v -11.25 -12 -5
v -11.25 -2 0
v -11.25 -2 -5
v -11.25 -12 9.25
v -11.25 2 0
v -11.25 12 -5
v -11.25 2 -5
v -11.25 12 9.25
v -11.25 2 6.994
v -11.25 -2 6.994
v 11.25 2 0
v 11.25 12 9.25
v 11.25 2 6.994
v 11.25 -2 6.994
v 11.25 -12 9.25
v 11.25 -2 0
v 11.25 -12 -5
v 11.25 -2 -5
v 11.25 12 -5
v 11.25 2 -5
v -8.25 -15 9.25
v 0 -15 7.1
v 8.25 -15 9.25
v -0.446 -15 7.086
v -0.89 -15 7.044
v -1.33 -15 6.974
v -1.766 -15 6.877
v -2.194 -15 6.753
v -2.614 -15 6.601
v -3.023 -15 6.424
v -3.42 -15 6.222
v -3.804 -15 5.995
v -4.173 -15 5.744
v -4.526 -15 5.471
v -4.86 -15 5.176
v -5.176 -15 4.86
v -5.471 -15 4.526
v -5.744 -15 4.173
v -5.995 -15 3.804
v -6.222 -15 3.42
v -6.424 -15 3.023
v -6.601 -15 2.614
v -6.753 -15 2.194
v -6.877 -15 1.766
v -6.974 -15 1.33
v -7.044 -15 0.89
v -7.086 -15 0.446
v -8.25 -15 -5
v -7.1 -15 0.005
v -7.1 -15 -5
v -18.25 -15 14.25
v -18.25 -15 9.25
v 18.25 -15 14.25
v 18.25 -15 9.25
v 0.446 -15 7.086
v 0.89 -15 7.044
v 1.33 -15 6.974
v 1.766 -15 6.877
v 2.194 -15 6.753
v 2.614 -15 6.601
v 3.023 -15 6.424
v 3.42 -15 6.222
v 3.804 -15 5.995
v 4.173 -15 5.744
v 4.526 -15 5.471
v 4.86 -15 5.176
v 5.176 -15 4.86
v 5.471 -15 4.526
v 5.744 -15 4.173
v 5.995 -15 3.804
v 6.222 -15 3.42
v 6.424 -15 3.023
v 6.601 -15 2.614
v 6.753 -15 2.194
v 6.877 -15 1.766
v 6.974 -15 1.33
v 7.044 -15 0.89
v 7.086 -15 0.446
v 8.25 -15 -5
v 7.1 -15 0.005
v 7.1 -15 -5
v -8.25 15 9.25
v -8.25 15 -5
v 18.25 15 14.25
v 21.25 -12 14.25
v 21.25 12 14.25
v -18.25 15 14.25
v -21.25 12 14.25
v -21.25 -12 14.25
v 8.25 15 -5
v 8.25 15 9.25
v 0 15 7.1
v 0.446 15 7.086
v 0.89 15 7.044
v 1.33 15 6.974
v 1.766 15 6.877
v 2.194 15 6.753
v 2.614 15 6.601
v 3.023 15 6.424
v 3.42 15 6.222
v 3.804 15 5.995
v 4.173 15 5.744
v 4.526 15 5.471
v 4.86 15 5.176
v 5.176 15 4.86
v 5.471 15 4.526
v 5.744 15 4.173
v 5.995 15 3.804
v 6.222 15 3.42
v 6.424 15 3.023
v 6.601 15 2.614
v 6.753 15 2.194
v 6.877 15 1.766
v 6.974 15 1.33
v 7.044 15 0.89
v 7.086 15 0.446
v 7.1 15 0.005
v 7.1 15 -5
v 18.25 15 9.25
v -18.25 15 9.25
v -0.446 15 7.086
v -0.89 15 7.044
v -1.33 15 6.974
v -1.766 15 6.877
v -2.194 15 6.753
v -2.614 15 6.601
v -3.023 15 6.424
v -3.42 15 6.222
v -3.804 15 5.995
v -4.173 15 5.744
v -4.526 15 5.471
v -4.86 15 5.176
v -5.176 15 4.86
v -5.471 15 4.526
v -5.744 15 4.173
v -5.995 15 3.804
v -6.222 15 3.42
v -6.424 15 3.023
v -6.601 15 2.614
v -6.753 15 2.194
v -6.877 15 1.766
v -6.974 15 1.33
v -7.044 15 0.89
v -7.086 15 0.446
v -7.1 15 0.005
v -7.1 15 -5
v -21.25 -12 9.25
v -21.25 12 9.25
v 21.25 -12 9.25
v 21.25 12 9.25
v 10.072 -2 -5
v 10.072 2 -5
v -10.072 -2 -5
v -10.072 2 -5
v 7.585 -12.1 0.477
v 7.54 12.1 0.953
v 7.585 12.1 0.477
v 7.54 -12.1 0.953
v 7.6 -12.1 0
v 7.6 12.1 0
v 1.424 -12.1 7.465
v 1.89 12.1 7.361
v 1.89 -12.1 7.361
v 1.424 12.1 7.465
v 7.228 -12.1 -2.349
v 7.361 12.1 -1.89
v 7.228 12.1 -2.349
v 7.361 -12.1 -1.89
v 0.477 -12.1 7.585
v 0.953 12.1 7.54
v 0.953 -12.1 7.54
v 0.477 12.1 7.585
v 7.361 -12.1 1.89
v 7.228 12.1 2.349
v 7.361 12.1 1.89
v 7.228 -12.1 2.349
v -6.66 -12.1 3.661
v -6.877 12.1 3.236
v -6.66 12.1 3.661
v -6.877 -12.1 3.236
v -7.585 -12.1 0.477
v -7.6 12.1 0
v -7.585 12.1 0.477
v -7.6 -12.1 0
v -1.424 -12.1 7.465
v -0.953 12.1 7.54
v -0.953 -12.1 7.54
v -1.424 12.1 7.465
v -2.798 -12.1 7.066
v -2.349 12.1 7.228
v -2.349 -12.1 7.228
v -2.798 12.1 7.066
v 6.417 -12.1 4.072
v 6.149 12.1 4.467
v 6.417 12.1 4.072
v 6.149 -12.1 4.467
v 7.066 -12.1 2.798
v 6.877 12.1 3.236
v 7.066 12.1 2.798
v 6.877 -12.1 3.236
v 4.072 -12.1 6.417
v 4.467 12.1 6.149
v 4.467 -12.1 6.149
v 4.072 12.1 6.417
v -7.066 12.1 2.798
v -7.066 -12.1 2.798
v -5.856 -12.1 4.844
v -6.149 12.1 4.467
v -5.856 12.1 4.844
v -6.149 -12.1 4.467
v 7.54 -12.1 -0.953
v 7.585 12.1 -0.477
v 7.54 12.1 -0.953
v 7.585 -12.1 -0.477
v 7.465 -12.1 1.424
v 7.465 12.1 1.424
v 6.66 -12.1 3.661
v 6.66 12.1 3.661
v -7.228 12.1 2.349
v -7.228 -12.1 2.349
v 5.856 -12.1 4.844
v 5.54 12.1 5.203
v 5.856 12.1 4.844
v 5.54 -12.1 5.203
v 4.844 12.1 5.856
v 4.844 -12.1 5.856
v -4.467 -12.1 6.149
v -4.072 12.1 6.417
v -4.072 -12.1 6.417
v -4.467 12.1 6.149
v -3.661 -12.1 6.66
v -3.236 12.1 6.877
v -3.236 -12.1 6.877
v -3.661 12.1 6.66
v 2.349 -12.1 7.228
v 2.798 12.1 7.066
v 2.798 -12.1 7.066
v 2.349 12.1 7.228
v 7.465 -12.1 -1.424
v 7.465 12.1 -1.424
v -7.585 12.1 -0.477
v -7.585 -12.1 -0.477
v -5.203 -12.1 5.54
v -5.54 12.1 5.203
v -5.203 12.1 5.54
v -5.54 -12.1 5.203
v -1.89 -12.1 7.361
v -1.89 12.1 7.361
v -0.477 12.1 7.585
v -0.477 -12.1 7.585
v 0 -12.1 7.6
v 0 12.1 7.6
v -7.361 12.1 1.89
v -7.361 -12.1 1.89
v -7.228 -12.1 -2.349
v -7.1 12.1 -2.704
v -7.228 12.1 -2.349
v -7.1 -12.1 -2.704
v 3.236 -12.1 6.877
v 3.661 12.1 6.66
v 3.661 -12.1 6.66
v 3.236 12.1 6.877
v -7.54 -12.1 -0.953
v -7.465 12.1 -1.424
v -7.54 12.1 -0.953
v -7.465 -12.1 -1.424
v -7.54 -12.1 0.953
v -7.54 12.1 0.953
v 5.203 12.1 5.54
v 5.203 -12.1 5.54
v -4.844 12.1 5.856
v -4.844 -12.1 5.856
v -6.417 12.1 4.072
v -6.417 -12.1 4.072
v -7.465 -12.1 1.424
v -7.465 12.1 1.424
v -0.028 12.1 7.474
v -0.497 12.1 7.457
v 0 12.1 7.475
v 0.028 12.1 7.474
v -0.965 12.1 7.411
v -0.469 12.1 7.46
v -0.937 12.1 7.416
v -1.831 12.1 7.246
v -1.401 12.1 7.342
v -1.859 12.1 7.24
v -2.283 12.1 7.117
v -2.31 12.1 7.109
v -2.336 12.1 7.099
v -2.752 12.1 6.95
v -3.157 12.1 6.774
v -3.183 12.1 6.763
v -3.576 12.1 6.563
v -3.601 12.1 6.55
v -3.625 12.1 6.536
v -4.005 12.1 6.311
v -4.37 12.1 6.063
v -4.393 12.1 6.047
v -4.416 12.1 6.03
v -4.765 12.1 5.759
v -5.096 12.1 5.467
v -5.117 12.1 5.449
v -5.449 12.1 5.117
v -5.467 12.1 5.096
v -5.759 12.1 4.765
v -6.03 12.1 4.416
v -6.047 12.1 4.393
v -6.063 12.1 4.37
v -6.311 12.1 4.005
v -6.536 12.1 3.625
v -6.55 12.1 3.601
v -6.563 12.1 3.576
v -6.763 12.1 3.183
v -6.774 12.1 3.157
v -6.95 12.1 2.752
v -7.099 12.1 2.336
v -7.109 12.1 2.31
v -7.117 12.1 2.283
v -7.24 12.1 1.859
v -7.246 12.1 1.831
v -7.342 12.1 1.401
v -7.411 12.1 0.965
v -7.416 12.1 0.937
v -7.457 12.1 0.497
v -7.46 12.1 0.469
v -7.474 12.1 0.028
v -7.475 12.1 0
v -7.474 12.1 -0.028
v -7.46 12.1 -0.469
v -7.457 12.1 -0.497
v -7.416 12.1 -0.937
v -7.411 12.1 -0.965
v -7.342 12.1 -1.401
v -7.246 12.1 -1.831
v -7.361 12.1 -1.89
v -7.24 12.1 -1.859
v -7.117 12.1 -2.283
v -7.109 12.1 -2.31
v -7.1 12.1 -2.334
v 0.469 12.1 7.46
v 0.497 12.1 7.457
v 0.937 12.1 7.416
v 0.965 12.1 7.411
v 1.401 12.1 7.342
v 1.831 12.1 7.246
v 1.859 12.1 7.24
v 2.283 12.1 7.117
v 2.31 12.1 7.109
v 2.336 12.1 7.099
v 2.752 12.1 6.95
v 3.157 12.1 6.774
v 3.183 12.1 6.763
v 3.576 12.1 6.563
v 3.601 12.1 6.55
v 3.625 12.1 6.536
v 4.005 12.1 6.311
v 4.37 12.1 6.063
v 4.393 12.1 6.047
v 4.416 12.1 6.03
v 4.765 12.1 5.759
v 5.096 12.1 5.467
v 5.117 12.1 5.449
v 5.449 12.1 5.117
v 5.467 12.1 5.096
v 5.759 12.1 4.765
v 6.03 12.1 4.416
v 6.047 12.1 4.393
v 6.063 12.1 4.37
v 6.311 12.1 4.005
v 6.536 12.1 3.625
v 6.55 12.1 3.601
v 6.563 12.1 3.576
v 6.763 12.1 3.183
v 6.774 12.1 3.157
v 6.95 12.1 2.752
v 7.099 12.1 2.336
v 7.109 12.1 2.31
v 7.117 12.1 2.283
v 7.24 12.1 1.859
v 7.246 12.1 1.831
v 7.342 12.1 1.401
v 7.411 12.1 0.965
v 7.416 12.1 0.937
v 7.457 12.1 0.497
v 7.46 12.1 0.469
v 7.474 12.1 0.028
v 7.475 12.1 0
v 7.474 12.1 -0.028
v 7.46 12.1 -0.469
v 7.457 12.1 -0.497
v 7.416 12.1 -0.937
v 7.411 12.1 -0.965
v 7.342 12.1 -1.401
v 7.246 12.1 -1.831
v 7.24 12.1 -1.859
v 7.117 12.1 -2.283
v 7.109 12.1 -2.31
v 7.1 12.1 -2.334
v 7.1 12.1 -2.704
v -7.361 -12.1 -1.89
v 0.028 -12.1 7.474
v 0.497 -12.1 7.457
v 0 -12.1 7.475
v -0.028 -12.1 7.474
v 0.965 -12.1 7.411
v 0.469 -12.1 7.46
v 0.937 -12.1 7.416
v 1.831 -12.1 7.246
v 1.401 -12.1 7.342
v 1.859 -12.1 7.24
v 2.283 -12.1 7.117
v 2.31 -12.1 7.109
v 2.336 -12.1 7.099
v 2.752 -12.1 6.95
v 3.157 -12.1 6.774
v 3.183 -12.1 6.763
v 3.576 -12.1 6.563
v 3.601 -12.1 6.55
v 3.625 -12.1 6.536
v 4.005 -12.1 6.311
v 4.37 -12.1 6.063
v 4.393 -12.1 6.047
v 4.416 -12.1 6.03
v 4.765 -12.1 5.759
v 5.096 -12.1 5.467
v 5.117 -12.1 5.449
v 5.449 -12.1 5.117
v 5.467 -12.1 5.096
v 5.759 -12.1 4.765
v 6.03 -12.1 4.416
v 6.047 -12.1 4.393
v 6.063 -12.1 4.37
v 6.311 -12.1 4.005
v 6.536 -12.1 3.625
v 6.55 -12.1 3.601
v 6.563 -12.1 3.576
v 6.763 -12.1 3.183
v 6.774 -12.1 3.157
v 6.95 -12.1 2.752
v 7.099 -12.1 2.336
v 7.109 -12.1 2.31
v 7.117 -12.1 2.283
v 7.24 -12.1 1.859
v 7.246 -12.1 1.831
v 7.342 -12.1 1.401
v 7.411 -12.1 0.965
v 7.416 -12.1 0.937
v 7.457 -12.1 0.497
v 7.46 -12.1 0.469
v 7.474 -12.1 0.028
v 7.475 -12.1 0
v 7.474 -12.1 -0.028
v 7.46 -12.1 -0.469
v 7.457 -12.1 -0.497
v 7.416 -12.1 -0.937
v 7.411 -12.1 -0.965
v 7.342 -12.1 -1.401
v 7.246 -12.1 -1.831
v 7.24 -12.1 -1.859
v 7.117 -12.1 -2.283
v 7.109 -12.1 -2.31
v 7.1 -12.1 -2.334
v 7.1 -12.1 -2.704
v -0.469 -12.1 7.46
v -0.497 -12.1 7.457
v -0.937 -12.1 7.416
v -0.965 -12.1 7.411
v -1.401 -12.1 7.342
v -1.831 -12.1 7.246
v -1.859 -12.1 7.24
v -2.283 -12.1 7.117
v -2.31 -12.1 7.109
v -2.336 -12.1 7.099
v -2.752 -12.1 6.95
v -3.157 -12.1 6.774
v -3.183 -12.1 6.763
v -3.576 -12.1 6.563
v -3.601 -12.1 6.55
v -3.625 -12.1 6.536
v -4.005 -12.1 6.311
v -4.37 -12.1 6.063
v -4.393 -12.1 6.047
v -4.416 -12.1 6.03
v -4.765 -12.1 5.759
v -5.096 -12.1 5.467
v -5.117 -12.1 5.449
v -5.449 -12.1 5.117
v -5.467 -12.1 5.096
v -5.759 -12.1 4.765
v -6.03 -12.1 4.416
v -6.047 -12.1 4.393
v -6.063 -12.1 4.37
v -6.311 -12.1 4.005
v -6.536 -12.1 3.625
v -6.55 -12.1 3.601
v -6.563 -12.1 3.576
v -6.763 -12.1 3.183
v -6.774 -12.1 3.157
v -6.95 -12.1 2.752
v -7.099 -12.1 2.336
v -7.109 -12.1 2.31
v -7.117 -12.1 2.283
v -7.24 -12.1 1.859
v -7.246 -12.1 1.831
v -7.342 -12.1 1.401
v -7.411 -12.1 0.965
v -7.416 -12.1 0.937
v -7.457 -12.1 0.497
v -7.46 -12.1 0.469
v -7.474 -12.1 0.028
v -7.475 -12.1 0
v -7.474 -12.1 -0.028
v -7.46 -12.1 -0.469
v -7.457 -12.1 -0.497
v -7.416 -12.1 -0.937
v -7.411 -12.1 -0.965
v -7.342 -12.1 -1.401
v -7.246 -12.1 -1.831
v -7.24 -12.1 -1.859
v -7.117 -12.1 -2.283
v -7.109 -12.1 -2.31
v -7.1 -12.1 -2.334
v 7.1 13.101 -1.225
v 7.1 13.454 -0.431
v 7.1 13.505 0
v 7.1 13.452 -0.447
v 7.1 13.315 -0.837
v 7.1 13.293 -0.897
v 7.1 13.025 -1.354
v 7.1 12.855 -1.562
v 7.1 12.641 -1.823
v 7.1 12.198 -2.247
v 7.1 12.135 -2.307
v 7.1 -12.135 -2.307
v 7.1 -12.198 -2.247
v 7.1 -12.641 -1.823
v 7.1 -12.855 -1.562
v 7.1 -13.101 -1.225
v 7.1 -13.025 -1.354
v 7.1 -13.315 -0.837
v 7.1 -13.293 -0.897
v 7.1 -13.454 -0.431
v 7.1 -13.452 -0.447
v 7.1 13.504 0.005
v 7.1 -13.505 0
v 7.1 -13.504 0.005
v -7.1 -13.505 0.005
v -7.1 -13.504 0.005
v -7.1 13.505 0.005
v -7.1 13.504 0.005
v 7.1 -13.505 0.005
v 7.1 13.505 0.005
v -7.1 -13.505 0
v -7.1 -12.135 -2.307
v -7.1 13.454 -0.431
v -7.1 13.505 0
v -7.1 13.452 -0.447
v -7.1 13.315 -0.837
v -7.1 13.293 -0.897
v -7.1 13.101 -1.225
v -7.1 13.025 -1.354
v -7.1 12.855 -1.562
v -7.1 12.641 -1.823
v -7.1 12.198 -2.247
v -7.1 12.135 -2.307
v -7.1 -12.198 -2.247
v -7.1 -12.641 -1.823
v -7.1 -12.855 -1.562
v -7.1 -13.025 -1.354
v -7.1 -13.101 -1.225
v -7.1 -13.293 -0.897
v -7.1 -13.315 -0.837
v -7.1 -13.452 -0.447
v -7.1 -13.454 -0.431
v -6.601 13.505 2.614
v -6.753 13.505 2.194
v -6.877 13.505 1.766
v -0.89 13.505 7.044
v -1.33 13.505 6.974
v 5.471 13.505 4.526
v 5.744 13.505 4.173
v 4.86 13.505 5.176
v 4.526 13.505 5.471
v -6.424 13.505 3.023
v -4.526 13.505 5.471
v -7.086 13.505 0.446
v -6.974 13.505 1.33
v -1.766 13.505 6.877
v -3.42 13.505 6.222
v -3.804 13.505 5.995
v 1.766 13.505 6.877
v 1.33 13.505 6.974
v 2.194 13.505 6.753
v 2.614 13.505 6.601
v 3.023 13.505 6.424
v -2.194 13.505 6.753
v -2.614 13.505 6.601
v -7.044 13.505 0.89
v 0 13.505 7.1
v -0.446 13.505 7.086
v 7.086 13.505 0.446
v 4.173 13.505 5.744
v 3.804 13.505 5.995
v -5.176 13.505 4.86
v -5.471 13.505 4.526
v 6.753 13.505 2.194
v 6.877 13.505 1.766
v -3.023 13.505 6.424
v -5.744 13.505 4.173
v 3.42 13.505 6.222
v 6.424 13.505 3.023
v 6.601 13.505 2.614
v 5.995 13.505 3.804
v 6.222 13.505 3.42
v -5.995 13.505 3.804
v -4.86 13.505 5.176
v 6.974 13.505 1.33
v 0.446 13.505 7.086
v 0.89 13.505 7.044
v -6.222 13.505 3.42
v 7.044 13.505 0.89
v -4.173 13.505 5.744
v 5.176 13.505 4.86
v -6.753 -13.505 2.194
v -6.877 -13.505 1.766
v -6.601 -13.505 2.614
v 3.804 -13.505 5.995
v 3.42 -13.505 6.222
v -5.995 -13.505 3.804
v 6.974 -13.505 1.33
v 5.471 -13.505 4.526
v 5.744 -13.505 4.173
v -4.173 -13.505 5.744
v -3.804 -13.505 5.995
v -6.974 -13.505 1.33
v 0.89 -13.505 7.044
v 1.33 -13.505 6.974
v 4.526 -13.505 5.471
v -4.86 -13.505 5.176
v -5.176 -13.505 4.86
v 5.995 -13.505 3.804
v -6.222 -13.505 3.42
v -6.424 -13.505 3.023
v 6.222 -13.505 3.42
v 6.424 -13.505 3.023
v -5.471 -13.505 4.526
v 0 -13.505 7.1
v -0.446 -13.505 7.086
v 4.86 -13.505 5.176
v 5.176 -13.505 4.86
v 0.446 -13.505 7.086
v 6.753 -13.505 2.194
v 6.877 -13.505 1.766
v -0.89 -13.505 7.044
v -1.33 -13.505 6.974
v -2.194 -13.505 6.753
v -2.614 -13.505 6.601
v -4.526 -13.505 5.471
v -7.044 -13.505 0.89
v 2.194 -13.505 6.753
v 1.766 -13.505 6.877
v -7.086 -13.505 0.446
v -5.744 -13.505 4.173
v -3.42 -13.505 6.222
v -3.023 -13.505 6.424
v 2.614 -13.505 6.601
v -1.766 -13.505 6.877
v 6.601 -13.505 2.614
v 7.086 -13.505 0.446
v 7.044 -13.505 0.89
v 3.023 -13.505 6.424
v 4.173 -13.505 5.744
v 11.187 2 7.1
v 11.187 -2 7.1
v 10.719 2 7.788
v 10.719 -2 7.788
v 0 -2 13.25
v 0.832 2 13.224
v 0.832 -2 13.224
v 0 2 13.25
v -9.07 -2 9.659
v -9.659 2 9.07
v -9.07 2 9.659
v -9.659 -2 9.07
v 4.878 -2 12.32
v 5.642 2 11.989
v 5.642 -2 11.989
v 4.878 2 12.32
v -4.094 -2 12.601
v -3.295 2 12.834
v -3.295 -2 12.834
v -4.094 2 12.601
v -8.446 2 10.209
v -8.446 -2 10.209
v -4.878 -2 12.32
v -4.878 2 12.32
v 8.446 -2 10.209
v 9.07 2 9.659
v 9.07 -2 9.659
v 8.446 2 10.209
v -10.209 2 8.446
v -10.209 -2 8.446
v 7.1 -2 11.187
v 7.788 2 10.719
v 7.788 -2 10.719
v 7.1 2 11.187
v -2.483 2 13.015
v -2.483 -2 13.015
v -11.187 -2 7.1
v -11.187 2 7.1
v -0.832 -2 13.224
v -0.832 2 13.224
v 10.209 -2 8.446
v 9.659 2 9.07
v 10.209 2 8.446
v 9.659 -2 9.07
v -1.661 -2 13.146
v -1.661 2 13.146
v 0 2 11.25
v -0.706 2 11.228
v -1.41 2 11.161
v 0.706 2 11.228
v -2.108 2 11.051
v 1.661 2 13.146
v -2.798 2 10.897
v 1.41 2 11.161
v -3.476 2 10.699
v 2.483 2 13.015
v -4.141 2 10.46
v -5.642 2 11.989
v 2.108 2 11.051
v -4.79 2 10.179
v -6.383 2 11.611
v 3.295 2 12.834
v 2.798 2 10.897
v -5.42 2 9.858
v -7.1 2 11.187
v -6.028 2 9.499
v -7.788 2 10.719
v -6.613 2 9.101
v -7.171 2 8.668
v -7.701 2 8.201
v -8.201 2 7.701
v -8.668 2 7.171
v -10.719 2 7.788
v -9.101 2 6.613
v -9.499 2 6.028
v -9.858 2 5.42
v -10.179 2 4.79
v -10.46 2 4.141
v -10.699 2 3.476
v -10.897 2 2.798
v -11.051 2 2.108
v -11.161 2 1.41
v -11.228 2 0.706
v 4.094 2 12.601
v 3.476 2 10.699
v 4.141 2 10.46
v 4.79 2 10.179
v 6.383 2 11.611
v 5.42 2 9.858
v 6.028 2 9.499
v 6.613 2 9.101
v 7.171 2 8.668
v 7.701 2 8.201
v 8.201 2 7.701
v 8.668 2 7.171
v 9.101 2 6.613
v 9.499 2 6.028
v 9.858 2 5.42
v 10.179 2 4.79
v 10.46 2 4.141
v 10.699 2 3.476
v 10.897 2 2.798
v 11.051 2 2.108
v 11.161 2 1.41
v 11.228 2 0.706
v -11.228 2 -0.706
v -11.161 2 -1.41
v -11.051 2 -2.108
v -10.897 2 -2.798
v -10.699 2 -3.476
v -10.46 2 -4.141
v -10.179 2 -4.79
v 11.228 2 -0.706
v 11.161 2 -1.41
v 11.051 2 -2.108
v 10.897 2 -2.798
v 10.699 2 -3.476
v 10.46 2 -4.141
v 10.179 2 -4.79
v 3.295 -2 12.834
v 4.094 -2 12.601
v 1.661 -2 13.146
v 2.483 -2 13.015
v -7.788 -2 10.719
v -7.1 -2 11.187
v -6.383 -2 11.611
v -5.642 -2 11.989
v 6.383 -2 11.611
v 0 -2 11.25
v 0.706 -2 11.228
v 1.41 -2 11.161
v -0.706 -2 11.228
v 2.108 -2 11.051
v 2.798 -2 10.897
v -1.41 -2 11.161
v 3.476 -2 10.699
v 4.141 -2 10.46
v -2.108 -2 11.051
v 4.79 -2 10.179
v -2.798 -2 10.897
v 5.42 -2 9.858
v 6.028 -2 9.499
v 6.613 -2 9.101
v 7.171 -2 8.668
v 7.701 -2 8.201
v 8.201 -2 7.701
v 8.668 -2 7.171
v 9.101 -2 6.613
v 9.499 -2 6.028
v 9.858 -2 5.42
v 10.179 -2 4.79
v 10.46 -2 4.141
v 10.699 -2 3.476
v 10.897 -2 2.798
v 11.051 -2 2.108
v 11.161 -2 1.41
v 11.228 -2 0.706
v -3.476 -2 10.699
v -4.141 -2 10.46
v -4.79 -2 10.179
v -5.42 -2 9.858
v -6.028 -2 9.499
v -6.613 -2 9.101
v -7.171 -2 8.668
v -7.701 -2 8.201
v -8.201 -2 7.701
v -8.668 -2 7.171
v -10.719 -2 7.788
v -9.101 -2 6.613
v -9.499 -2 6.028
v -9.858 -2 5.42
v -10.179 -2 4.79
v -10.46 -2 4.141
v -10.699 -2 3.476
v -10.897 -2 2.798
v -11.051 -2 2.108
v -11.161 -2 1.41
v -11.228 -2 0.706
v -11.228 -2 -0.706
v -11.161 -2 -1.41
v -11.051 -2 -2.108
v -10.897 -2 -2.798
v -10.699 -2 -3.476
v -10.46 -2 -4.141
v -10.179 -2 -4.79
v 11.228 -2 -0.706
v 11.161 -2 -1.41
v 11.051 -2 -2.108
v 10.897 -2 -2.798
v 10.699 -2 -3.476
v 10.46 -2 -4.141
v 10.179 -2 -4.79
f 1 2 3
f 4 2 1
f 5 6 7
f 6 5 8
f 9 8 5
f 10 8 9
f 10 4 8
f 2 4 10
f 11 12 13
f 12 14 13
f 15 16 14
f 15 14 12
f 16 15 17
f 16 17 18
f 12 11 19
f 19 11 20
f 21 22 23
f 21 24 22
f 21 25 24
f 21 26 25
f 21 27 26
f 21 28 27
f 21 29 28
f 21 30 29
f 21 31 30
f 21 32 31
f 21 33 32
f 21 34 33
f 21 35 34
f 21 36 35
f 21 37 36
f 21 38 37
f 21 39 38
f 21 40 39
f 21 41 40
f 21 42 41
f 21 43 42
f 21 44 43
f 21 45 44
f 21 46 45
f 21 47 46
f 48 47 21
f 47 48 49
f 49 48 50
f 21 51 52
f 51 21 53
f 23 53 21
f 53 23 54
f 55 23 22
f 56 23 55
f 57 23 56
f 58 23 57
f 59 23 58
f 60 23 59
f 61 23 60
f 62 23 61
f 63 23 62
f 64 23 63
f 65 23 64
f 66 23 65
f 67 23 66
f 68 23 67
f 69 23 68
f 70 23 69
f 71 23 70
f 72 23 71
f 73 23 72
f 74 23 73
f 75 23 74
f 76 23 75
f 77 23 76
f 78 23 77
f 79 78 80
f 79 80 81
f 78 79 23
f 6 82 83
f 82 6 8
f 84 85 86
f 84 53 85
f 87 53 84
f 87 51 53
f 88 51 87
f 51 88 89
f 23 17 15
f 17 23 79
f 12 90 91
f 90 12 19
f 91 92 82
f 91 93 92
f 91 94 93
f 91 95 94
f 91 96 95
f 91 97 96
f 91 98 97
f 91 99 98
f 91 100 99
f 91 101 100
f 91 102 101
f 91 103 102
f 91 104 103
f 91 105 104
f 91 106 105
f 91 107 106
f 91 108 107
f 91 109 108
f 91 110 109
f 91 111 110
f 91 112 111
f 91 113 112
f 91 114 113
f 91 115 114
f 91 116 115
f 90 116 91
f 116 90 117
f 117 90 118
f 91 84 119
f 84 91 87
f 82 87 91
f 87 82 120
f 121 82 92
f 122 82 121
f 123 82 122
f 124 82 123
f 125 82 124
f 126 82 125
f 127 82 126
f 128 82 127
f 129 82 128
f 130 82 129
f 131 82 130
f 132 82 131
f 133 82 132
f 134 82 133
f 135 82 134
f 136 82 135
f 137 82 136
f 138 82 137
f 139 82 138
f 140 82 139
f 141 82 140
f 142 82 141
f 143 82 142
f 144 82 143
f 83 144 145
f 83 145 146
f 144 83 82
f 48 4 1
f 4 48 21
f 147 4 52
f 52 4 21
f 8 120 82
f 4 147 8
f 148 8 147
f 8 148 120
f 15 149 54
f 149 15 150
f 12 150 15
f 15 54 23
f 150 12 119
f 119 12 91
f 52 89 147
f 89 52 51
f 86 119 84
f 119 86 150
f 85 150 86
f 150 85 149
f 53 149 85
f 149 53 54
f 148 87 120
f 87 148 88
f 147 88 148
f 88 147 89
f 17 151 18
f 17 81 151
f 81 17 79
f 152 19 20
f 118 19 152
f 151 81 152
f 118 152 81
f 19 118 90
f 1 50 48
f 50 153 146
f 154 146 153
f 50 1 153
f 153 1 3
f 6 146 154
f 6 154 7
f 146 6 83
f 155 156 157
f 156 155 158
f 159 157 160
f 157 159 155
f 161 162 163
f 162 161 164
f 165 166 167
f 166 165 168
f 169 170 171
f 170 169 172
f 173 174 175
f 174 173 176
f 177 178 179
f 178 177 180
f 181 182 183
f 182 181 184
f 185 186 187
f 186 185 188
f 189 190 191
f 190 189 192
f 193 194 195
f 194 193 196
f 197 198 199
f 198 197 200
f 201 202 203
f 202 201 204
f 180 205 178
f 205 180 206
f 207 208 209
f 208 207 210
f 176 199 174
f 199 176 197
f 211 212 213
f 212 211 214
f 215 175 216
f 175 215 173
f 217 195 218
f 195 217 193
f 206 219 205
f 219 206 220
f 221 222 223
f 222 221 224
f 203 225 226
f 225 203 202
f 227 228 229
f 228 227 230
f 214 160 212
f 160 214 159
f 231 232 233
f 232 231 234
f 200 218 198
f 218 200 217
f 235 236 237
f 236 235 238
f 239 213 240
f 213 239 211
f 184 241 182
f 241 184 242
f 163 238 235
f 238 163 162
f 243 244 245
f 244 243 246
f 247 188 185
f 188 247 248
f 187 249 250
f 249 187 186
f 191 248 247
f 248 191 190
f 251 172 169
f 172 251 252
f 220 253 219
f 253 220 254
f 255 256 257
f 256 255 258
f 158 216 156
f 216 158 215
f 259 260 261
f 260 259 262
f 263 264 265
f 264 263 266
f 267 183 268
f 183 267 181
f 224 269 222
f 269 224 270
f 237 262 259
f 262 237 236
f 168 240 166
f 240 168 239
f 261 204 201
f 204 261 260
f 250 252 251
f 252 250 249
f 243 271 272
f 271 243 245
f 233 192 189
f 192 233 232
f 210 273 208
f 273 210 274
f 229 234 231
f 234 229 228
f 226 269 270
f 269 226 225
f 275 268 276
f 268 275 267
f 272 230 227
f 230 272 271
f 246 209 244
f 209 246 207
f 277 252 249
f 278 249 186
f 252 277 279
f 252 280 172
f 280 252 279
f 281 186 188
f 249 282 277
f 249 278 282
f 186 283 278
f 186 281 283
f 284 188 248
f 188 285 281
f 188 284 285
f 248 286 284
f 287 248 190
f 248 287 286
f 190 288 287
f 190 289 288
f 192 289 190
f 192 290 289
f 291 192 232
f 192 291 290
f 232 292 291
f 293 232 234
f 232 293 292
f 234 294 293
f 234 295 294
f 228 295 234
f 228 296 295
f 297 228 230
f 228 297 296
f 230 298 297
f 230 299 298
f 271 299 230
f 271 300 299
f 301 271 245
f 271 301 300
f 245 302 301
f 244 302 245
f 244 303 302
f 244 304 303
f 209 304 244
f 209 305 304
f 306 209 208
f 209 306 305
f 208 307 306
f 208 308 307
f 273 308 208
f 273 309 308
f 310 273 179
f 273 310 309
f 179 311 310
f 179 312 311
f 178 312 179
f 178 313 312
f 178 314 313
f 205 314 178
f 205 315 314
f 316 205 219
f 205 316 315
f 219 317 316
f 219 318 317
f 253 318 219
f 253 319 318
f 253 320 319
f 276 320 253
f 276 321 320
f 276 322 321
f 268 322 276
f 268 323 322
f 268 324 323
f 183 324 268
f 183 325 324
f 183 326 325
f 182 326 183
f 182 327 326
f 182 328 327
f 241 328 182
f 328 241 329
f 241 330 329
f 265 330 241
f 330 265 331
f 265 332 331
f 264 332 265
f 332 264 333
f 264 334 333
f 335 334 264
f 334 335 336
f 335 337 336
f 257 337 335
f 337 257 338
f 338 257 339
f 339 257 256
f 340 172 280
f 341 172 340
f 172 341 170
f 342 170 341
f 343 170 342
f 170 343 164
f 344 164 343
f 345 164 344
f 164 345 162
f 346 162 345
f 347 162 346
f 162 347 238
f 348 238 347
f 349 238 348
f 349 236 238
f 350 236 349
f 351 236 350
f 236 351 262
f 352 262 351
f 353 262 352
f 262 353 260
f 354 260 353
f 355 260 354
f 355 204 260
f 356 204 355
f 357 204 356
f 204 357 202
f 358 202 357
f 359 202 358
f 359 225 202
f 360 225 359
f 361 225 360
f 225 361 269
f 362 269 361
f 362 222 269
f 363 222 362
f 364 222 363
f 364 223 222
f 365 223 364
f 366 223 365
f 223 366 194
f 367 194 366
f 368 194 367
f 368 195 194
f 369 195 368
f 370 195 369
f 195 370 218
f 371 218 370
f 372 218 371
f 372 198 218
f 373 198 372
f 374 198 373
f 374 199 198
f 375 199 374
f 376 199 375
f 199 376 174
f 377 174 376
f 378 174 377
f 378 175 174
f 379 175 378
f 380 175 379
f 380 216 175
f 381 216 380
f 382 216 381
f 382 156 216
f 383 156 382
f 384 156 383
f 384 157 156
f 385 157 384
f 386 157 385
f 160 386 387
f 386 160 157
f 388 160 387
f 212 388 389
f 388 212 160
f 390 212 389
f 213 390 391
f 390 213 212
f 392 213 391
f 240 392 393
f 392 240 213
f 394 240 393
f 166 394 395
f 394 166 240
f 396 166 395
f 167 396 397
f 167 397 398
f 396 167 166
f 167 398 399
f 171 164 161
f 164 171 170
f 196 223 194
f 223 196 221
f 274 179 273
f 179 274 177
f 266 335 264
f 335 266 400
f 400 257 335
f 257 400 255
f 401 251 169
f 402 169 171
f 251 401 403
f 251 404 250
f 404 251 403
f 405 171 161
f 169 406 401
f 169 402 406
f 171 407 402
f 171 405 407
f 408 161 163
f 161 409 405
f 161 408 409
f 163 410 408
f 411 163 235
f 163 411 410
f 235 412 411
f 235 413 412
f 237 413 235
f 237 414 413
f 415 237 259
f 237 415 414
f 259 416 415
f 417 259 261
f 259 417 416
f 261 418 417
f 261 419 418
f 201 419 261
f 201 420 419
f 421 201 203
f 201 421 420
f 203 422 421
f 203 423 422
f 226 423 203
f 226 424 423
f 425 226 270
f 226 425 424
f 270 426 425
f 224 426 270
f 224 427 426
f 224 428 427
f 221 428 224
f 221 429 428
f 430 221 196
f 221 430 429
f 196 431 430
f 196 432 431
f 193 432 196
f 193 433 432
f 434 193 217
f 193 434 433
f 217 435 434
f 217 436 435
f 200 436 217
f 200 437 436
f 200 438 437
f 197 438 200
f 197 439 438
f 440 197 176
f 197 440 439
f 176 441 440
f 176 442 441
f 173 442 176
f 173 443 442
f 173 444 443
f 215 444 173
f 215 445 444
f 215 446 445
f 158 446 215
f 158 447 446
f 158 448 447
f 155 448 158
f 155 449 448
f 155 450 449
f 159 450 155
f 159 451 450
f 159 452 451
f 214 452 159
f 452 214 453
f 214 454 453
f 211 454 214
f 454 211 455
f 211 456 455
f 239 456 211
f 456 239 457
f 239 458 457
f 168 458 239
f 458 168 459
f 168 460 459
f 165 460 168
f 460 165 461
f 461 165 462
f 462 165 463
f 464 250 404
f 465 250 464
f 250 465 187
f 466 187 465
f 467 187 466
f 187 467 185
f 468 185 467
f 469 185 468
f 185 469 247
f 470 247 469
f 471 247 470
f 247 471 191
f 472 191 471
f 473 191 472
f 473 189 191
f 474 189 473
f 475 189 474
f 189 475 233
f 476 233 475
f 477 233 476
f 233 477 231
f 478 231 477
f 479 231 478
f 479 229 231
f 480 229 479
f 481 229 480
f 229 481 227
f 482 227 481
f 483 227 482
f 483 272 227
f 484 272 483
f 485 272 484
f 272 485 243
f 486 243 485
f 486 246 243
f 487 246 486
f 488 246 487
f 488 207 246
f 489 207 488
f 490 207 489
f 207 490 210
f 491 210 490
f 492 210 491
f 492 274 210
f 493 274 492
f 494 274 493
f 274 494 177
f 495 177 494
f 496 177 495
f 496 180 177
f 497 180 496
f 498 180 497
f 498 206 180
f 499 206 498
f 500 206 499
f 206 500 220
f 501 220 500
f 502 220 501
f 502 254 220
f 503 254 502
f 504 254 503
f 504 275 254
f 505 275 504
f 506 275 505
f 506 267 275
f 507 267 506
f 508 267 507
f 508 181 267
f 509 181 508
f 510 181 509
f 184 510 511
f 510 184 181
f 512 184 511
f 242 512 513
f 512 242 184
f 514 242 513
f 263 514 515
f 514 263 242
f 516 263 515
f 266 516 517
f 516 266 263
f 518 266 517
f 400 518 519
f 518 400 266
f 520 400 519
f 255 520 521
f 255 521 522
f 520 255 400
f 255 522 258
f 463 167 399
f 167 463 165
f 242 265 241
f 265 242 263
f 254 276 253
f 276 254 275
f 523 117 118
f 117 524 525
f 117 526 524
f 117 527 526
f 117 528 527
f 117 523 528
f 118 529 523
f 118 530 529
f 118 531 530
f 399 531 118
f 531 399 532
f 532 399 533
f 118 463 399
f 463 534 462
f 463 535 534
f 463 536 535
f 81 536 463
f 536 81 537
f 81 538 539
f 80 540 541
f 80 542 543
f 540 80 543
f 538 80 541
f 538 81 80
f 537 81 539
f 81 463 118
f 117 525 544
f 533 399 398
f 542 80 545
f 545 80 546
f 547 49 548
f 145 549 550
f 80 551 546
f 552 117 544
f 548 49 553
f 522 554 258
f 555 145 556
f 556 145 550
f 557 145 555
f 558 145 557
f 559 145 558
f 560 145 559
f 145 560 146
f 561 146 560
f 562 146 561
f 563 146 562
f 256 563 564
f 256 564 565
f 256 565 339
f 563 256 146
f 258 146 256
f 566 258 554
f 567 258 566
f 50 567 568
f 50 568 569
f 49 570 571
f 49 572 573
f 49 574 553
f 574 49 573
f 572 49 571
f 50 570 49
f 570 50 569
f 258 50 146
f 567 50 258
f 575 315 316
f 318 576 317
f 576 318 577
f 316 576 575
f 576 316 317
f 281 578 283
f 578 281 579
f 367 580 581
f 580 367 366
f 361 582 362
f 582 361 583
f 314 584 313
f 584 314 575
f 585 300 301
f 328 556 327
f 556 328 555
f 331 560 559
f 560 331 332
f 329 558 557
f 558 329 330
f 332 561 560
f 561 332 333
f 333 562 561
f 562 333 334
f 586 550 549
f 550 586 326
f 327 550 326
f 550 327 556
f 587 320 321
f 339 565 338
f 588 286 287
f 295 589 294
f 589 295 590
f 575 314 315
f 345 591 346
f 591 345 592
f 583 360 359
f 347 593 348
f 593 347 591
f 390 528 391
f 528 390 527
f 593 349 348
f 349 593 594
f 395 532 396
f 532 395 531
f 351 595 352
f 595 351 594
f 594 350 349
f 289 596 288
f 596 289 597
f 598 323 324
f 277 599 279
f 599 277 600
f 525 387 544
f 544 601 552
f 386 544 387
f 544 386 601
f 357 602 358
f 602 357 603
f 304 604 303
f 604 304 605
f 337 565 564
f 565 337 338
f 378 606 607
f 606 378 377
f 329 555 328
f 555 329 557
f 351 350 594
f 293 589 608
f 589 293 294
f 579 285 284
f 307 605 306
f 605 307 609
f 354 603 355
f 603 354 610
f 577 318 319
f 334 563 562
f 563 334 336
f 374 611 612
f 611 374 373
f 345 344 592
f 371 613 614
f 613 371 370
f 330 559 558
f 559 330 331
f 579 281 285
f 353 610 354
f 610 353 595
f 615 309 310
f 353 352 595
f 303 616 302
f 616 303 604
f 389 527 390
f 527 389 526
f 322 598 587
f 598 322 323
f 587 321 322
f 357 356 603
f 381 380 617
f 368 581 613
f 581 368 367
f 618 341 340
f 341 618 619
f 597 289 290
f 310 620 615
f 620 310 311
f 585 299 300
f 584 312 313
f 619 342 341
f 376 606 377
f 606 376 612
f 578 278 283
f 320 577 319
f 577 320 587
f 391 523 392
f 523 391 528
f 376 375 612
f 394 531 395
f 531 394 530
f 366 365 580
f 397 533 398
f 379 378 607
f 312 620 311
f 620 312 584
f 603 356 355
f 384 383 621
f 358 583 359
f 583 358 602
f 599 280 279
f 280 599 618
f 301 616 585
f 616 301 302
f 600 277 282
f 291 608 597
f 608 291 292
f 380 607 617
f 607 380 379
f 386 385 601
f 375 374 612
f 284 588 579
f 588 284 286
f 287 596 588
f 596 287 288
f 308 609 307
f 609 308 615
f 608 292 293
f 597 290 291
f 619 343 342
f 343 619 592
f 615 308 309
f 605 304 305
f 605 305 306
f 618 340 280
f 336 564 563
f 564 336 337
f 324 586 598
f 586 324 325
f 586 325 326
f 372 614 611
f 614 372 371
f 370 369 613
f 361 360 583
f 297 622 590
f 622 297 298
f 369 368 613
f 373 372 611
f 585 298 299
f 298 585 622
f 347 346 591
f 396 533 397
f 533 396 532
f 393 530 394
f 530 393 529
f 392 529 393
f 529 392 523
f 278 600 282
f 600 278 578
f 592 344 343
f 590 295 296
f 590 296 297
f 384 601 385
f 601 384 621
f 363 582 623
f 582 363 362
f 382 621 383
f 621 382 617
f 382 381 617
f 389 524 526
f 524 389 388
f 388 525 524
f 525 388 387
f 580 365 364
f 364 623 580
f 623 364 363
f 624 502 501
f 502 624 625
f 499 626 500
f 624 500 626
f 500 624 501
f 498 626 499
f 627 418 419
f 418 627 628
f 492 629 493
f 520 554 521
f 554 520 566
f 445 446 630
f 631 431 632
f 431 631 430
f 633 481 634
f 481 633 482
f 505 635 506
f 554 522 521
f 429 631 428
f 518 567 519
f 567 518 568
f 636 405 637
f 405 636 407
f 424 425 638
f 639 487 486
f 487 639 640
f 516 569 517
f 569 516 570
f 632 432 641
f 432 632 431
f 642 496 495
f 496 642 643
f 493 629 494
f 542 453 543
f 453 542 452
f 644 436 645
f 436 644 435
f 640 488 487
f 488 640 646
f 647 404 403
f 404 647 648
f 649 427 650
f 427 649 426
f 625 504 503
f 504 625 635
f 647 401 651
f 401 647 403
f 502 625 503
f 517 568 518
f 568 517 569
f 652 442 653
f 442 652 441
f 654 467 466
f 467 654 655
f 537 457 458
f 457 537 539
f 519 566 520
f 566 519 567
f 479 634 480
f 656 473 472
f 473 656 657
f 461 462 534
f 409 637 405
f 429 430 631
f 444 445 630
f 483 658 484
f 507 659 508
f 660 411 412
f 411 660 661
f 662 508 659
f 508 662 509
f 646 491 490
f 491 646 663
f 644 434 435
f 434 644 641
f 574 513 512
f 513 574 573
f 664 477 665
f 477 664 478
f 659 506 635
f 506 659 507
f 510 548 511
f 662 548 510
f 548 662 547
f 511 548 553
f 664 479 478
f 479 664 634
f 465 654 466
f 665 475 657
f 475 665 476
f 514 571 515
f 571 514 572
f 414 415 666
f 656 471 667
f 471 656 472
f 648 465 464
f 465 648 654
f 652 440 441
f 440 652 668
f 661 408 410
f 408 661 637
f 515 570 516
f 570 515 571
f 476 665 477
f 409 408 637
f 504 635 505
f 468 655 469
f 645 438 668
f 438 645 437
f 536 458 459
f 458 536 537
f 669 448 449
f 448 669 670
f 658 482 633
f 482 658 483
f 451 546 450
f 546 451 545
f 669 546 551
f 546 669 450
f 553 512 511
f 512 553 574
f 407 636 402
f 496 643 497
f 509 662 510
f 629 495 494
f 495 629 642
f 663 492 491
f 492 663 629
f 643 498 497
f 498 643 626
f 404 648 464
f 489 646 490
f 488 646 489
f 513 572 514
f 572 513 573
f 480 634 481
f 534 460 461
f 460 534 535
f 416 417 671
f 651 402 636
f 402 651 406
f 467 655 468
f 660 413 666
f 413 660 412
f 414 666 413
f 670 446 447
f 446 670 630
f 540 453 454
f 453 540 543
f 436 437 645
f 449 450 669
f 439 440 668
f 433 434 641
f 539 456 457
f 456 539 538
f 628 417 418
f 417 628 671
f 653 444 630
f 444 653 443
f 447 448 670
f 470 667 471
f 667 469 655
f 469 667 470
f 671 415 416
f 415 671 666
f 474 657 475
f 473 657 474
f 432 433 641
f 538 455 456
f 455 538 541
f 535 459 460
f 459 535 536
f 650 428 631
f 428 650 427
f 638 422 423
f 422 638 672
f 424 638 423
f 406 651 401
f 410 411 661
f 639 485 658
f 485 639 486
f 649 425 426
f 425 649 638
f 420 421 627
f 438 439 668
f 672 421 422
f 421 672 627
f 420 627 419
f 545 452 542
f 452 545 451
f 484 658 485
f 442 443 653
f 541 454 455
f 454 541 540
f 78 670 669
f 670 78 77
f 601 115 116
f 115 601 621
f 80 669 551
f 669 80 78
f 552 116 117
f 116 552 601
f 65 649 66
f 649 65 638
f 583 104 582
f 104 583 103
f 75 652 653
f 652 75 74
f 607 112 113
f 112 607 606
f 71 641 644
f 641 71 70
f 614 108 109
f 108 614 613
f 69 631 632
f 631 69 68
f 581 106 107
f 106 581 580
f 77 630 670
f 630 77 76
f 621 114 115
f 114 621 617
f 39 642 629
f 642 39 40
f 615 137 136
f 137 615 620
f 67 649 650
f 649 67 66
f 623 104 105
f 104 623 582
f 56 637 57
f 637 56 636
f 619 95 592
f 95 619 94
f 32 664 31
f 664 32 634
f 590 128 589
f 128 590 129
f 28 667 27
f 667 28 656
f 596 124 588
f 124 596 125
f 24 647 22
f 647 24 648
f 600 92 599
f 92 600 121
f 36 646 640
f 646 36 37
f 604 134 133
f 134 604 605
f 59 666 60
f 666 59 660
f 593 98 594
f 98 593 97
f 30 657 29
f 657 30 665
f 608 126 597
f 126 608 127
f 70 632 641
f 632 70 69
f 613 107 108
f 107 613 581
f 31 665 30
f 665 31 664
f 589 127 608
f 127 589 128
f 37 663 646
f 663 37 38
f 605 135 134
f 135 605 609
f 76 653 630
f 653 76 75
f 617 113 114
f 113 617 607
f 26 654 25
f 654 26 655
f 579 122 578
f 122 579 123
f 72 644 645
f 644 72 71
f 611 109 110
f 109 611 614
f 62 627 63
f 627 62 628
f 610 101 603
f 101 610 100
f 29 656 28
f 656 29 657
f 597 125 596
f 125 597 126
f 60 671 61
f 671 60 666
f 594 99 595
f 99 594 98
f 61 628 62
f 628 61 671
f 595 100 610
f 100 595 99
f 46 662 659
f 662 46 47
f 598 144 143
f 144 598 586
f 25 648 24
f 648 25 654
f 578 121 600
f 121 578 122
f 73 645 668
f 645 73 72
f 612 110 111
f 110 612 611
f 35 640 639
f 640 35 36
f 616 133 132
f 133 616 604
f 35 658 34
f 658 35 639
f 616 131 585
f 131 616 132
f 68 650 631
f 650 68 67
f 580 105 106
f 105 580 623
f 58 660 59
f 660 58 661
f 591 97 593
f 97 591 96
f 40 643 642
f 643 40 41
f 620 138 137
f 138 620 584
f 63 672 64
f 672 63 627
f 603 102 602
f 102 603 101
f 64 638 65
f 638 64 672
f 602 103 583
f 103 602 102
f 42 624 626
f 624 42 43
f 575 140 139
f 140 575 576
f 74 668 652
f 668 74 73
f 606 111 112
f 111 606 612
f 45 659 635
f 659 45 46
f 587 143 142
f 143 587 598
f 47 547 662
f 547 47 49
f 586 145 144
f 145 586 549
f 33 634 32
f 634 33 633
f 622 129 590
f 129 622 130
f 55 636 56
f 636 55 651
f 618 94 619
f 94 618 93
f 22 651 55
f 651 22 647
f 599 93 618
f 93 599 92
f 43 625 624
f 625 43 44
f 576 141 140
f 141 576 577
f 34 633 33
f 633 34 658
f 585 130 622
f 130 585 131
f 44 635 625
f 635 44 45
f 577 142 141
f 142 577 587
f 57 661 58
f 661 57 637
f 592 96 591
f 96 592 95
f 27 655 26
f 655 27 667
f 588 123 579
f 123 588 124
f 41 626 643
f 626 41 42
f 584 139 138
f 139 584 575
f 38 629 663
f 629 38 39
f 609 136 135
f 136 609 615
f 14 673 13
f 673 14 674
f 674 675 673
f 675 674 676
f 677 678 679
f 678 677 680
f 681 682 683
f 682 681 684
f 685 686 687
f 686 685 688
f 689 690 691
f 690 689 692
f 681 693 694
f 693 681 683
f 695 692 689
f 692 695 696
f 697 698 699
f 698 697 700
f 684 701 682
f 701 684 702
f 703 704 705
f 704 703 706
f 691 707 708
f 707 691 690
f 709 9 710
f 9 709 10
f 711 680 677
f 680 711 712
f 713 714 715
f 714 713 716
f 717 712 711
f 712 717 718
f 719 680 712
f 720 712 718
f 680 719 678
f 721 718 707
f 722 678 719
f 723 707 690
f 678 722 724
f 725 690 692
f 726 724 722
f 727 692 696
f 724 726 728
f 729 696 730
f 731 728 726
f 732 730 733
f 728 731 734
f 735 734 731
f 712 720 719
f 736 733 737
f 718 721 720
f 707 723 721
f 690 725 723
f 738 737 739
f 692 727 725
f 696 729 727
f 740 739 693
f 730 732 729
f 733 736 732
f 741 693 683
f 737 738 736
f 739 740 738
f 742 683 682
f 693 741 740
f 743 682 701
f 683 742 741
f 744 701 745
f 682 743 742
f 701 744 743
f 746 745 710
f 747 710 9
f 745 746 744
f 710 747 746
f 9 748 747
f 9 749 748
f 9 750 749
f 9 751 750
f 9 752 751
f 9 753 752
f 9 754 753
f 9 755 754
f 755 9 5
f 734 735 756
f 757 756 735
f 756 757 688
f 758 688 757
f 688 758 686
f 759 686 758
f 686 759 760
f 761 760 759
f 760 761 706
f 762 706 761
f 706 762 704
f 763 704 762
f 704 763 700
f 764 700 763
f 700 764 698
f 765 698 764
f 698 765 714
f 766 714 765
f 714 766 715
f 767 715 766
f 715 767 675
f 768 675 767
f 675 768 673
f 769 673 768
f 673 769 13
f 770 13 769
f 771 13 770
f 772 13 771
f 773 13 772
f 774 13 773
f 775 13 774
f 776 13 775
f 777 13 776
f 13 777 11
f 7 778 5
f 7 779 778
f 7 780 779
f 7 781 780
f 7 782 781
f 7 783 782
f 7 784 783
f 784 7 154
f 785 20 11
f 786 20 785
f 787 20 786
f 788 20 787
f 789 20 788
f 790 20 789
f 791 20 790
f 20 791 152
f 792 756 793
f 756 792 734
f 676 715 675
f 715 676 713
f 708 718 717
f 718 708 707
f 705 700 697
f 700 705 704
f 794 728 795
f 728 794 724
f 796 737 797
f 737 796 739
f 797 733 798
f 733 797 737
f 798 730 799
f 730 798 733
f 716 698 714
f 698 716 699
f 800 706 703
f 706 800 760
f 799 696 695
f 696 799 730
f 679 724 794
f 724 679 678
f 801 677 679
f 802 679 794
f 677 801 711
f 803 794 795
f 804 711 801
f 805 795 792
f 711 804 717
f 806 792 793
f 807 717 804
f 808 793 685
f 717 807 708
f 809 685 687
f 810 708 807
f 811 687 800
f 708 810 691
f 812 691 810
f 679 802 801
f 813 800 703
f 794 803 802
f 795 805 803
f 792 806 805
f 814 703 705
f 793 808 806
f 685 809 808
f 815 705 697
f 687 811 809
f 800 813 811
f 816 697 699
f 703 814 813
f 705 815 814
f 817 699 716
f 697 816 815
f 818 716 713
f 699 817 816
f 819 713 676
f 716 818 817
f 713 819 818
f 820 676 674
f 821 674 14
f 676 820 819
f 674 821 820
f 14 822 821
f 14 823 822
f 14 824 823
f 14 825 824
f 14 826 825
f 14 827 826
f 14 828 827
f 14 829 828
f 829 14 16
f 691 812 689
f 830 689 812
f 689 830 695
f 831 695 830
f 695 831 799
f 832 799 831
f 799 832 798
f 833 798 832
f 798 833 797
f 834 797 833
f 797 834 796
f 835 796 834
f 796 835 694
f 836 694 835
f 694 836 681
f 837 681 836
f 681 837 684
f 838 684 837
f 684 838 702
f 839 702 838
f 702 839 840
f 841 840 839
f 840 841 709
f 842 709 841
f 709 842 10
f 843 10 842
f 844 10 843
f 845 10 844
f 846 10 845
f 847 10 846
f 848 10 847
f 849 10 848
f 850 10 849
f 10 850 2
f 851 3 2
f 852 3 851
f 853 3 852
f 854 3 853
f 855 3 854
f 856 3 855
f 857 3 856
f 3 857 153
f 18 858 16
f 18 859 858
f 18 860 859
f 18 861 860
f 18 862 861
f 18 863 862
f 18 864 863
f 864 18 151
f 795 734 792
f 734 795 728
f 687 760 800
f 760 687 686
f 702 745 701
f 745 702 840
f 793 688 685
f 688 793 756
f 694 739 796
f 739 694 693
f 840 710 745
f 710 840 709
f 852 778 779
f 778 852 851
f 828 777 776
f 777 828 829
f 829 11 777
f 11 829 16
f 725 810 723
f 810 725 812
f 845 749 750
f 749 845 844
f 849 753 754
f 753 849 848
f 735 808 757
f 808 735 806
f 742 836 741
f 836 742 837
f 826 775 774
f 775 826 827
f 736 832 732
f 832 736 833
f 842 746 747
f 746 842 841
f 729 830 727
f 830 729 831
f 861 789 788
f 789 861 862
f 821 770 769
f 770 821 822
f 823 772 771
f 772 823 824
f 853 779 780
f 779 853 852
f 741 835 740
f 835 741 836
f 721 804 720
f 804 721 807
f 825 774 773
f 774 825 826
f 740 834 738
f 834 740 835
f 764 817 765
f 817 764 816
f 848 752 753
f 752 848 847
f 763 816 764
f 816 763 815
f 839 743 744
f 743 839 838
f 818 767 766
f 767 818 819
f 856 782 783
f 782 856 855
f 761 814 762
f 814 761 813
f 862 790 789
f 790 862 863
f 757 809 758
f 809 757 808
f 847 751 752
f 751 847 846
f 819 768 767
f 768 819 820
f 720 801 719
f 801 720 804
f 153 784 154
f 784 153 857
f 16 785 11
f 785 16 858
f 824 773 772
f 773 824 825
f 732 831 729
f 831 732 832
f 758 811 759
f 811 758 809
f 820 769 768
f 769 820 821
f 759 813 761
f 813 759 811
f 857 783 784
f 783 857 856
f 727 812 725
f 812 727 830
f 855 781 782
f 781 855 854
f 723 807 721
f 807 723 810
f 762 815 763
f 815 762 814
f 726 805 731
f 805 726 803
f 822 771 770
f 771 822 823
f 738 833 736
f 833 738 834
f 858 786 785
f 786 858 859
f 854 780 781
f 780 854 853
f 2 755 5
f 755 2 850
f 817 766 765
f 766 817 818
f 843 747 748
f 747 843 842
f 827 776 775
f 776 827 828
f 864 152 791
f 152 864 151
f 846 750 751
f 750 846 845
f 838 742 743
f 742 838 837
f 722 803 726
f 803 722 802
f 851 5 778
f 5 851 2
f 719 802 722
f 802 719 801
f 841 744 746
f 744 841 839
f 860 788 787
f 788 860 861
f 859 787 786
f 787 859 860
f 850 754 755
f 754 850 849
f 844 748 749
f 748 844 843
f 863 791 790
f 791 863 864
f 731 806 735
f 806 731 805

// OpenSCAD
$fn=100;

Y_linearBearingModel = "LM8UU";
axes_Ysmooth_rodD = 8.5;
workbed_separation_from_Y_smooth_rod = 10;
Y_singleLinearBearingHolder_screwSize = 3;
PCBholder_height = 10;
color_movingPart = "orange";
LinearBearingPressureFitTolerance = 0.4;
workbed_thickness = 8+3;

LINEAR_BEARING_dr = 0;  //Inscribed circle
LINEAR_BEARING_D  = 1;  //Outer diameter
LINEAR_BEARING_L  = 2;  //Length
LINEAR_BEARING_B  = 3;  //Outer locking groove B
LINEAR_BEARING_D1 = 4;  //Outer locking groove D1
LINEAR_BEARING_W  = 5;  //W


// Common bearing names
LinearBearing = "LM8UU";

// Linear Bearing dimensions
//  model == "XXXXX"   ?   [    dr,      D,      L,        B,      D1,       W]:
function linearBearingDimensions(model) =
    model == "LM3UU"   ?   [  3,   7,  10,   0.0,   0.0, 0.00]:
    model == "LM4UU"   ?   [  4,   8,  12,   0.0,   0.0, 0.00]:
    model == "LM5UU"   ?   [  5,  10,  15,  10.2,   9.6, 1.10]:
    model == "LM6UU"   ?   [  6,  12,  19,  13.5,  11.5, 1.10]:
    model == "LM8SUU"  ?   [  8,  15,  17,  11.5,  14.3, 1.10]:
    model == "LM10UU"  ?   [ 10,  19,  29,  22.0,  18.0, 1.30]:
    model == "LM12UU"  ?   [ 12,  21,  30,  23.0,  20.0, 1.30]:
    model == "LM13UU"  ?   [ 13,  23,  32,  23.0,  22.0, 1.30]:
    model == "LM16UU"  ?   [ 16,  28,  37,  26.5,  27.0, 1.60]:
    model == "LM20UU"  ?   [ 20,  32,  42,  30.5,  30.5, 1.60]:
    model == "LM25UU"  ?   [ 25,  40,  59,  41.0,  38.0, 1.85]:
    model == "LM30UU"  ?   [ 30,  45,  64,  44.5,  43.0, 1.85]:
    model == "LM35UU"  ?   [ 35,  52,  70,  49.5,  49.0, 2.10]:
    model == "LM40UU"  ?   [ 40,  60,  80,  60.5,  57.0, 2.10]:
    model == "LM50UU"  ?   [ 50,  80, 100,  74.0,  76.5, 2.60]:
    model == "LM60UU"  ?   [ 60,  90, 110,  85.0,  86.5, 3.15]:
    model == "LM80UU"  ?   [ 80, 120, 140, 105.5, 116.0, 4.15]:
    model == "LM100UU" ?   [100, 150, 150, 125.5, 145.0, 4.15]:
  /*model == "LM8UU"   ?*/ [  8,  15,  24,  17.5,  14.3, 1.10];


function linearBearing_dr(model) = linearBearingDimensions(model)[LINEAR_BEARING_dr];
function linearBearing_D(model)  = linearBearingDimensions(model)[LINEAR_BEARING_D];
function linearBearing_L(model)  = linearBearingDimensions(model)[LINEAR_BEARING_L];
function linearBearing_B(model)  = linearBearingDimensions(model)[LINEAR_BEARING_B];
function linearBearing_D1(model) = linearBearingDimensions(model)[LINEAR_BEARING_D1];
function linearBearing_W(model)  = linearBearingDimensions(model)[LINEAR_BEARING_W];

module linearBearing(pos=[0,0,0], angle=[0,0,0], model=LinearBearing,
                material=Steel, sideMaterial=BlackPaint) {
  dr = linearBearing_dr(model);
  D  = linearBearing_D(model);
  L  = linearBearing_L(model);
  B  = linearBearing_B(model);
  D1 = linearBearing_D1(model);
  W  = linearBearing_W(model);

  innerRim = dr + (D - dr) * 0.2;
  outerRim = D - (D - dr) * 0.2;
  midSink = W/4;

  translate(pos) rotate(angle) union() {
    color(material)
      difference() {
        // Basic ring
        Ring([0,0,0], D, dr, L, material, material);

        if(W) {
          // Side shields
          Ring([0,0,-epsilon], outerRim, innerRim, L*epsilon+midSink, sideMaterial, material);
          Ring([0,0,L-midSink-epsilon], outerRim, innerRim, L*epsilon+midSink, sideMaterial, material);
          //Outer locking groove
          Ring([0,0,(L-B)/2], D+epsilon, outerRim+W/2, W, material, material);
          Ring([0,0,L-(L-B)/2], D+epsilon, outerRim+W/2, W, material, material);
        }
      }
      if(W)
        Ring([0,0,midSink], D-L*epsilon, dr+L*epsilon, L-midSink*2, sideMaterial, sideMaterial);
  }

  module Ring(pos, od, id, h, material, holeMaterial) {
    color(material) {
      translate(pos)
        difference() {
          cylinder(r=od/2, h=h);
          color(holeMaterial)
            translate([0,0,-10*epsilon])
              cylinder(r=id/2, h=h+20*epsilon);
        }
    }
  }

}

module bcube(size,cr=0,cres=0)
{
  //-- Internal cube size
  bsize = size - 2*[cr,cr,0];

  //-- Get the (x,y) coorner coordinates in the 1st cuadrant
  x = bsize[0]/2;
  y = bsize[1]/2;

  //-- A corner radius of 0 means a standar cube!
  if (cr==0)
    cube(bsize,center=true);
  else {

      
      //-- The height of minkowski object is double. So
      //-- we sould scale by 0.5
      scale([1,1,0.5])

      //-- This translation is for centering the minkowski objet
      translate([-x, -y,0])

      //-- Built the  beveled cube with minkowski
      minkowski() {

        //-- Internal cube
        cube(bsize,center=true);

        //-- Cylinder in the corner (1st cuadrant)
        translate([x,y, 0])
          cylinder(r=cr, h=bsize[2],center=true, $fn=4*(cres+1));
      }
  }

}




module linearBearingHole(model="LM8UU", lateralExtension=10, pressureFitTolerance=0.4, lengthExtension=6, holderLength=1.5, tolerance=0.1) {
	linearBearingLength = linearBearing_L(model);
	linearBearingDiameter = linearBearing_D(model);
	
	dimY = linearBearingLength+lengthExtension;
	
	// Hole for linear bearing
	translate([0,linearBearingLength/2,0])
		rotate([90,0,0])
		translate([0,0,-tolerance])
			cylinder(r=linearBearingDiameter/2+tolerance, h=linearBearingLength+2*tolerance);
	// Slot for inserting the bearing
	translate([0,0,-lateralExtension/2])
		cube([linearBearingDiameter-pressureFitTolerance*2,dimY+0.01,lateralExtension+0.01], center=true);
	// Plastic holders to keep the bearing in place
	translate([0,linearBearingLength/2,0])
		hull() {
			translate([0,holderLength,0])
				rotate([90,0,0]) cylinder(r=linearBearingDiameter/2-pressureFitTolerance, h=0.01, center=true);
			rotate([90,0,0]) cylinder(r=linearBearingDiameter/2, h=0.01, center=true);
		}
	scale([1,-1,1]) translate([0,linearBearingLength/2,0])
		hull() {
			translate([0,holderLength,0])
				rotate([90,0,0]) cylinder(r=linearBearingDiameter/2-pressureFitTolerance, h=0.01, center=true);
			rotate([90,0,0]) cylinder(r=linearBearingDiameter/2, h=0.01, center=true);
		}
	rotate([90,0,0]) cylinder(r=linearBearingDiameter/2-pressureFitTolerance, h=dimY+1, center=true);//linearBearingHole(model=linearBearingModel, renderPart=true);
}
/*
module linearBearing_single(model="LM8UU", renderPart=false, echoPart=false) {
	renderStandardPart(renderPart)
		linearBearing(model=model);
	if(echoPart) echo(str("BOM: Linear bearing. Model ", model));
}
*/

module singleLinearBearingHolder()
{
	linearBearingLength = linearBearing_L(Y_linearBearingModel);
	linearBearingDiameter = linearBearing_D(Y_linearBearingModel);
	
	plasticHolderLength = 3;
	
	dimX = linearBearingDiameter+linearBearingDiameter/2;
	dimY = linearBearingLength+2*plasticHolderLength;
	dimZ = workbed_separation_from_Y_smooth_rod+axes_Ysmooth_rodD/2;
	
	holderExtension = linearBearingDiameter/3;
	
	screwSize = Y_singleLinearBearingHolder_screwSize;
	
	footSeparation = screwSize*2;
	footThickness = 5;
	
	workbed_screws_aditional_length = PCBholder_height;

		difference() {
			// Main part
			color(color_movingPart) union() {
                
				translate([0,0,dimZ/2])
					bcube([dimX,dimY,dimZ], cr=3, cres=0);
				translate([0,0,dimZ])
					hull() {
//						translate([screwSize/2,0,-footThickness/2])
						translate([0,0,-footThickness/2])
							bcube([dimX+20,dimY,footThickness], cr=3, cres=0);
                        /*
						translate([dimX/2+footSeparation,0,-footThickness/2])
							cylinder(r=screwSize+3,h=footThickness,center=true); */
					}
				translate([0,0,-holderExtension/2])
					bcube([dimX,dimY,holderExtension], cr=3, cres=0);
			}
			// Hole for linear bearing
			linearBearingHole(model=Y_linearBearingModel, lateralExtension=holderExtension, pressureFitTolerance=LinearBearingPressureFitTolerance, lengthExtension=2*plasticHolderLength, holderLength=plasticHolderLength/2);
			// Slot for zip-tie
			rotate([90,0,0]) difference() {
				cylinder(r=dimX/2+2,h=4,center=true);
				cylinder(r=dimX/2,h=4+0.1,center=true);
			}
		}
}


singleLinearBearingHolder();
